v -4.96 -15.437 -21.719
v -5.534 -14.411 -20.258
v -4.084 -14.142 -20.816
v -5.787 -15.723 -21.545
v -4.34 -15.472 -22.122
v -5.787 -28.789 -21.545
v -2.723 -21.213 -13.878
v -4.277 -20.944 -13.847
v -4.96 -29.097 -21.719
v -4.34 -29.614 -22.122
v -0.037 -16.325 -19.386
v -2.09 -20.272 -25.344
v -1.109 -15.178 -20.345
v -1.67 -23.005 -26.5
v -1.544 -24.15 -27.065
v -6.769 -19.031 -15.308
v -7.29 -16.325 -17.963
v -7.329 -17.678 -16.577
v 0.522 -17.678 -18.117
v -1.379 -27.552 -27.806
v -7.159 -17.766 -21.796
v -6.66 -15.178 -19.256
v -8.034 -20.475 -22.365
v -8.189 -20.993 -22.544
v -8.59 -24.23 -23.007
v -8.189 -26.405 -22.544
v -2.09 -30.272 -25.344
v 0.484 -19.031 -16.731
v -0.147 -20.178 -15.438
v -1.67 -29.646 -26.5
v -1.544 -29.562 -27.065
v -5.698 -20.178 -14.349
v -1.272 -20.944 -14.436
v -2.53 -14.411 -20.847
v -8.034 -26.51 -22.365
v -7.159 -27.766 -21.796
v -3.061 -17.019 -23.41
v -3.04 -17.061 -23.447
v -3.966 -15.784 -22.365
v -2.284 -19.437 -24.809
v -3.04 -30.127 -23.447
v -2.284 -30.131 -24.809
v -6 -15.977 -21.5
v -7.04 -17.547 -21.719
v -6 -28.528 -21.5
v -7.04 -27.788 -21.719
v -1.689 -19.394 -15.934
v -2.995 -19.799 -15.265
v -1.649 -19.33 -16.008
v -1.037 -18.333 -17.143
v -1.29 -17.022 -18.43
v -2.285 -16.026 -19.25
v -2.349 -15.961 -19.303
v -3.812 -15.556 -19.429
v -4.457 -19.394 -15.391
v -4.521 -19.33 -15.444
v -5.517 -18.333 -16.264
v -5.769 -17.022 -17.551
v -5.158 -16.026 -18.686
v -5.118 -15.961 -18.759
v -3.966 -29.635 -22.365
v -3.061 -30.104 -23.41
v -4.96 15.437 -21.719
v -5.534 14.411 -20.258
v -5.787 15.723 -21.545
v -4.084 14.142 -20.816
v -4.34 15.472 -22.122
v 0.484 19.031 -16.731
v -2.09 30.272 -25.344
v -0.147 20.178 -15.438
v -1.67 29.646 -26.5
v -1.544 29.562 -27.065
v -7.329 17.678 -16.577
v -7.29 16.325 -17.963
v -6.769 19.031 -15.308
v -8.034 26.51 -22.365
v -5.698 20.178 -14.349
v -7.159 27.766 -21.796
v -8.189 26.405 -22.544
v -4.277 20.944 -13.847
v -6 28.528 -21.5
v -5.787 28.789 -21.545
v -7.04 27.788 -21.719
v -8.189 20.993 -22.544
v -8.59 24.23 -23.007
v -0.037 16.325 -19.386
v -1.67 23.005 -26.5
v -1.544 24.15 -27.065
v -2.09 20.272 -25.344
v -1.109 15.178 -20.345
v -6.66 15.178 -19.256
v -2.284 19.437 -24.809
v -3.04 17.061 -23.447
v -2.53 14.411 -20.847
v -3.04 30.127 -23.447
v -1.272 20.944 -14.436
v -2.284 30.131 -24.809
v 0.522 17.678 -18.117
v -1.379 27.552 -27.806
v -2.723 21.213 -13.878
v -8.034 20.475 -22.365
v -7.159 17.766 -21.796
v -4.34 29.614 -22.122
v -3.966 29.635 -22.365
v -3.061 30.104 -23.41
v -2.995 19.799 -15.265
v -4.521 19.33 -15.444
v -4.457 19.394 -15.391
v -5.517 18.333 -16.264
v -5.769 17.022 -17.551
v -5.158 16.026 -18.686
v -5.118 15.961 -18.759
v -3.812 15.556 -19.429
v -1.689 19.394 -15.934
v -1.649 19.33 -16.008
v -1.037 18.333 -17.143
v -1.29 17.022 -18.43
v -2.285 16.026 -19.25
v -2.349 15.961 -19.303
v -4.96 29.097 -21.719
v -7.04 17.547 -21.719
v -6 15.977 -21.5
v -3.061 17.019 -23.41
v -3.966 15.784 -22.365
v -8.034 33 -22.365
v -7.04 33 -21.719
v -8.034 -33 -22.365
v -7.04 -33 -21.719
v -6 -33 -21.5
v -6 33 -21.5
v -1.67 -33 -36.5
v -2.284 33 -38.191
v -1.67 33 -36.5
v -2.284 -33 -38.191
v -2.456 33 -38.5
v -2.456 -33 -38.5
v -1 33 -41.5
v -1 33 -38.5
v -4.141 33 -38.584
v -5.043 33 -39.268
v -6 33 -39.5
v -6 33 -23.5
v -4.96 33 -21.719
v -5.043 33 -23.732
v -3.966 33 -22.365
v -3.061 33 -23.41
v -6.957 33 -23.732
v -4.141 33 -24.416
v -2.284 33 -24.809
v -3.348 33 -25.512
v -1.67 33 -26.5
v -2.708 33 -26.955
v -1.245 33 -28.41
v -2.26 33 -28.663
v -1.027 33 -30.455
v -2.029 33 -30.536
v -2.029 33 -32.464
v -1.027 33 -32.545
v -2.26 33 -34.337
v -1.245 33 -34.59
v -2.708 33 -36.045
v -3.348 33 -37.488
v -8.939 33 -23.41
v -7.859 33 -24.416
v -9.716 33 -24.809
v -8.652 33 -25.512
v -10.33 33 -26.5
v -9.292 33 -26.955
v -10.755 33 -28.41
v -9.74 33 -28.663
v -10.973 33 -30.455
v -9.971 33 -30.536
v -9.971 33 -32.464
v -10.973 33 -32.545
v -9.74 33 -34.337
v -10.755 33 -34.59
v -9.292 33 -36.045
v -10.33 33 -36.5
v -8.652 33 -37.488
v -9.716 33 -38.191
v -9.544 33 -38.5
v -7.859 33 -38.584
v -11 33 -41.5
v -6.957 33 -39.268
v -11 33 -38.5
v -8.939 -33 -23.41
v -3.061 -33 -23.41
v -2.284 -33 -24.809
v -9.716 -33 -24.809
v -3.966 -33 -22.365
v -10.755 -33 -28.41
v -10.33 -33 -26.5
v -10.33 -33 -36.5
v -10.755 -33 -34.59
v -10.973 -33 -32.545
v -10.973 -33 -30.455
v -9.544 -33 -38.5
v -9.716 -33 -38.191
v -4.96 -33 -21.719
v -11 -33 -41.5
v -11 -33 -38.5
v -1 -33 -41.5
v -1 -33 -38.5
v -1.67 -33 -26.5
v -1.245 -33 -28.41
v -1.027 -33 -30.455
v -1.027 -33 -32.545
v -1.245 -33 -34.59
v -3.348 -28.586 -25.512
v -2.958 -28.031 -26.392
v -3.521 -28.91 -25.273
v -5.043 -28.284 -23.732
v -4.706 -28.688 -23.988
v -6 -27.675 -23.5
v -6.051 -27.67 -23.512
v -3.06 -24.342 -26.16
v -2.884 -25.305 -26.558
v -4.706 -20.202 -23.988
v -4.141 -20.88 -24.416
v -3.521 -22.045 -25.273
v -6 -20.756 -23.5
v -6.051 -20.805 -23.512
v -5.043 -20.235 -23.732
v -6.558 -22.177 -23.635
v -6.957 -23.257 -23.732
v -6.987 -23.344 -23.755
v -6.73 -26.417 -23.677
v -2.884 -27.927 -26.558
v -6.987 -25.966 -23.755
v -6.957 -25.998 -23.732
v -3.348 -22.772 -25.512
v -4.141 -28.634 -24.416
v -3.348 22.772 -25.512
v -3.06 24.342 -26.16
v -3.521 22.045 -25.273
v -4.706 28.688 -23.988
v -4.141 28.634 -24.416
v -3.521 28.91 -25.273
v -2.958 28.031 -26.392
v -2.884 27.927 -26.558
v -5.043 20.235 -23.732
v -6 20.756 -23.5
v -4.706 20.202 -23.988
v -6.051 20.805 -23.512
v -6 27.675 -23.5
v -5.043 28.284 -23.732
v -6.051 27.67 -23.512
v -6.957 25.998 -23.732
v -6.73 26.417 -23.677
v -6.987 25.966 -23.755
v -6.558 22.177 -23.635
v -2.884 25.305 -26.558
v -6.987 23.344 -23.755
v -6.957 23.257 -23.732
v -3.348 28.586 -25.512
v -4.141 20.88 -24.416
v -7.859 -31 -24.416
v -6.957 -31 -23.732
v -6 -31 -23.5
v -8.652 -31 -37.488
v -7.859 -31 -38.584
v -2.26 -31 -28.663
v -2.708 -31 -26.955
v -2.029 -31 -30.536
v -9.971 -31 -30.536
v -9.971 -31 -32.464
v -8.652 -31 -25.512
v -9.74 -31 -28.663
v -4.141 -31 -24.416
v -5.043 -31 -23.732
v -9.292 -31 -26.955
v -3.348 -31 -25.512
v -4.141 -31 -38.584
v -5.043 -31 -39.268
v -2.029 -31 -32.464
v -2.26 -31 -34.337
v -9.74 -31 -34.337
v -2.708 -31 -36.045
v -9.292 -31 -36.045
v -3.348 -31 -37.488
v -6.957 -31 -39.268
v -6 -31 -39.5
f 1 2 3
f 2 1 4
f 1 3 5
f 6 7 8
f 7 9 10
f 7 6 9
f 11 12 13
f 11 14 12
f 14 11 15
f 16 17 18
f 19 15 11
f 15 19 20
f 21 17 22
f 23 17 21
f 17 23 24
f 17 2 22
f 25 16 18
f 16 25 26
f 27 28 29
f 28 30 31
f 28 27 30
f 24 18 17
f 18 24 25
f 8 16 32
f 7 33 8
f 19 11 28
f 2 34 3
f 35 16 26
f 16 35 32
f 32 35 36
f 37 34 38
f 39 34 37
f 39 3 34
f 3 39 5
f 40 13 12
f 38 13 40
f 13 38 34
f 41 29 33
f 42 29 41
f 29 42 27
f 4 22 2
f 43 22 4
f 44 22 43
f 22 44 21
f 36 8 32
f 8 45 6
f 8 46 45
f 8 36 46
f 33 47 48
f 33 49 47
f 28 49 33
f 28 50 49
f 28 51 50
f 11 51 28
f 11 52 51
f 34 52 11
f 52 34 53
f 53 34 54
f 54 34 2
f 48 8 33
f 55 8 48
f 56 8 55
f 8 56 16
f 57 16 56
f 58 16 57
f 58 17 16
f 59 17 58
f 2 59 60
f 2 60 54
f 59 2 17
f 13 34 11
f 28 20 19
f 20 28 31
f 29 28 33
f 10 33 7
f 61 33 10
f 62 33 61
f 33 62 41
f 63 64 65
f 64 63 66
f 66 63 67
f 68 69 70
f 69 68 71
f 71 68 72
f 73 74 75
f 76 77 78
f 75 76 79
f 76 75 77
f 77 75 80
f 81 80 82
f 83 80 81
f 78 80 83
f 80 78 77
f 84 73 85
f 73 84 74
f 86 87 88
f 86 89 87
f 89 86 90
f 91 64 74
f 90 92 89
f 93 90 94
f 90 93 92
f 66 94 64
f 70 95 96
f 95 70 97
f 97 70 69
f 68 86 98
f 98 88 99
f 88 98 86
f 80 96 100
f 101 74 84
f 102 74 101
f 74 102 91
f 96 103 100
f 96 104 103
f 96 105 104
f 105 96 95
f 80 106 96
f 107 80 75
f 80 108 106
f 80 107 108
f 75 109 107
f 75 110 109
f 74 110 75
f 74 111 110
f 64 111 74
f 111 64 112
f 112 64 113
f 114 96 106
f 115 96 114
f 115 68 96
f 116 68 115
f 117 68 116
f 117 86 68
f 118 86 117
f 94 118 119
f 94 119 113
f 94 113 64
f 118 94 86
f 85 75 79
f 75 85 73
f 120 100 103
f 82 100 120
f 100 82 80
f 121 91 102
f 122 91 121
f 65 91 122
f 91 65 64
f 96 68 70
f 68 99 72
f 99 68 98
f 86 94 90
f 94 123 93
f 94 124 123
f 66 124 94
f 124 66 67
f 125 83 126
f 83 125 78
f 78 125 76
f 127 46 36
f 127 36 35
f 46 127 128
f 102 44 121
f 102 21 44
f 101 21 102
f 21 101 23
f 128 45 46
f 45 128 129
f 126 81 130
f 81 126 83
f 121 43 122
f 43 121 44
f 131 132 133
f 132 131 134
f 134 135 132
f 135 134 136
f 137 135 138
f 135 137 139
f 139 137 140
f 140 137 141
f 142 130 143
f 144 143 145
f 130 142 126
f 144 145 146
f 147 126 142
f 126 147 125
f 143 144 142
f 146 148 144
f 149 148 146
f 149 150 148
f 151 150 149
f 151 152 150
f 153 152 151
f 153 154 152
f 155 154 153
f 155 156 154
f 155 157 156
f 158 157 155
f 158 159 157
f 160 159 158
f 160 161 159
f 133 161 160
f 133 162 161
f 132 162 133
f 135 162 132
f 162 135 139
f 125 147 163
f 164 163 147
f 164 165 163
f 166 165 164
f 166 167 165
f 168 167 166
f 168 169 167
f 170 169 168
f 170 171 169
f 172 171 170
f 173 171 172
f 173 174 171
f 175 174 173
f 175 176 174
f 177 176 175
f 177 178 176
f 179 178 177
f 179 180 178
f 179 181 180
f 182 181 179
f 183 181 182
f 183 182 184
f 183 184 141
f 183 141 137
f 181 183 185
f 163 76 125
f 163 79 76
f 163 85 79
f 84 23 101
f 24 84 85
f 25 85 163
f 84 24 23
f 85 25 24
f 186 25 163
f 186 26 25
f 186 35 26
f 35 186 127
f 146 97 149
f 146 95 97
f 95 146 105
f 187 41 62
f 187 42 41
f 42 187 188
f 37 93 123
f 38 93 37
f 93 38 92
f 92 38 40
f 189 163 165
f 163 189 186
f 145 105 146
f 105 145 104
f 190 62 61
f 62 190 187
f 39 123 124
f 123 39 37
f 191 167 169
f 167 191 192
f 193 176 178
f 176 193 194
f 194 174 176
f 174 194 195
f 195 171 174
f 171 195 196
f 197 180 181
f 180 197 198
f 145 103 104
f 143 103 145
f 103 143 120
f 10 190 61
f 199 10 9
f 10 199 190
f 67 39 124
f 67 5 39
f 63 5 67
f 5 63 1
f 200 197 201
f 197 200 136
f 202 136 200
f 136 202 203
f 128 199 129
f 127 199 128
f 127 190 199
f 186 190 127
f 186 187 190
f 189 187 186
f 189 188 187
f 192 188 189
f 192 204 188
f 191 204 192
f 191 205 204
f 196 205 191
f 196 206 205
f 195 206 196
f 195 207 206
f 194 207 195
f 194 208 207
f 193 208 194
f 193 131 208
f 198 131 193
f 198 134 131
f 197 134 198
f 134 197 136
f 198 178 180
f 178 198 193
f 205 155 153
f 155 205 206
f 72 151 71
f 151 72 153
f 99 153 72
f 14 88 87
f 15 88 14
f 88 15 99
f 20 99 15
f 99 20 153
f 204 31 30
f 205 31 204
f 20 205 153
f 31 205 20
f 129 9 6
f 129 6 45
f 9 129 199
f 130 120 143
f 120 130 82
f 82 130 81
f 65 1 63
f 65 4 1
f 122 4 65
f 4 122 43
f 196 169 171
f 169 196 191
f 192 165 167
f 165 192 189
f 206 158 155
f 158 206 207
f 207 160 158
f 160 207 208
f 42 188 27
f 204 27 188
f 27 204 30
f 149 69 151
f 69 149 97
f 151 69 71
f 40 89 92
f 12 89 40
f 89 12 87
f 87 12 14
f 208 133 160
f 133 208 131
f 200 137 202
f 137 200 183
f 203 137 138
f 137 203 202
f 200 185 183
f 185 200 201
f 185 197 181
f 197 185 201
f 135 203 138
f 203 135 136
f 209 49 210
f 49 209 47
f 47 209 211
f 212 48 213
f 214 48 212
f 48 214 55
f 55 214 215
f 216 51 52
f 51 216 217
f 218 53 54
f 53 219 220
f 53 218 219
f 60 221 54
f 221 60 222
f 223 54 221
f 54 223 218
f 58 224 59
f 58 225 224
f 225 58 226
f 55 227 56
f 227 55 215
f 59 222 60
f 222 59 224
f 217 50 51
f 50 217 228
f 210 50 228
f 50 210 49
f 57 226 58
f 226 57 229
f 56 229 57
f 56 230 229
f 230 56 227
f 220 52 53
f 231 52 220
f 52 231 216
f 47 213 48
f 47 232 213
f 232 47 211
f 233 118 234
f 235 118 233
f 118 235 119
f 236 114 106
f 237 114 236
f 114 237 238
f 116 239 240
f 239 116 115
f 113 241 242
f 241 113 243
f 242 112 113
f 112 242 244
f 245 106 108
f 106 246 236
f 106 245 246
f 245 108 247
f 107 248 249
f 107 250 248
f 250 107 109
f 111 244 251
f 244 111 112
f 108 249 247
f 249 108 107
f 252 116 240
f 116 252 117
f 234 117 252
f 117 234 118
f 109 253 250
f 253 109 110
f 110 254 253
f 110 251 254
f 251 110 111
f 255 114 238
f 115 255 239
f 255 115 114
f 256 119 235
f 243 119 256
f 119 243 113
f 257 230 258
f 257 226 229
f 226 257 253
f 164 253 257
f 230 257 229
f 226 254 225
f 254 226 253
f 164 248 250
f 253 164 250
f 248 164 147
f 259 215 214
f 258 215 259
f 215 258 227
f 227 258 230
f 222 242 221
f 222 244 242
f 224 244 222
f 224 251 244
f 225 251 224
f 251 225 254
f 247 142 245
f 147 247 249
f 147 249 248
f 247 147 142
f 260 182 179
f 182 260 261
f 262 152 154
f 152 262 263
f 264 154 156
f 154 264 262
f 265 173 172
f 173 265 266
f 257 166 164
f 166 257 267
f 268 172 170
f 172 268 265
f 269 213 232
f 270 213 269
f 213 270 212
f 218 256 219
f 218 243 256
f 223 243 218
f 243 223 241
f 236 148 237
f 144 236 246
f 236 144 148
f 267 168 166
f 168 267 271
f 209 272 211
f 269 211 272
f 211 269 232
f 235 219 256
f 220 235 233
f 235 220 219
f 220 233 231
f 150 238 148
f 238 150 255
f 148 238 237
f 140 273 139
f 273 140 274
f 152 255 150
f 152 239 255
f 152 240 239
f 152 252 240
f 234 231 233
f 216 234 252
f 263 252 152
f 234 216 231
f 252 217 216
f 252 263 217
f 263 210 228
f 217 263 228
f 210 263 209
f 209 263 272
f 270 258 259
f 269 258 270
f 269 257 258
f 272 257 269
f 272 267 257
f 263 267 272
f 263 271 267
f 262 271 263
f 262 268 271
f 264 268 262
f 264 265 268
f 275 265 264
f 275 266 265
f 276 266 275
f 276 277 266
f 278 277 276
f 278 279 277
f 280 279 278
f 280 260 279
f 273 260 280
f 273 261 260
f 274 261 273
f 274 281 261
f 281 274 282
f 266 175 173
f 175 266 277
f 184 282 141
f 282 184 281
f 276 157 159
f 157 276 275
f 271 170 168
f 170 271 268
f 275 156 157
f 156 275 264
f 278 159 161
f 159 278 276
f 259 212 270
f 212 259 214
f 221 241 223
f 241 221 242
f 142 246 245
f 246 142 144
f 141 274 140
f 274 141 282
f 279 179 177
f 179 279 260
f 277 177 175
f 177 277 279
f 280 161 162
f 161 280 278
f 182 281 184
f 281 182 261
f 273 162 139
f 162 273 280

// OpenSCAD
module nose(){
	scale([1,0.8,1])  cylinder(16.5 ,r=3);
}


module noses(){
	rotate([0,11.1,0]){
		rotate([90,0,-45]) translate([0,0,24]) nose();
		rotate([90,0,-45-90]) translate([0,0,24]) nose();
	}
}

module channel(){
	translate([-31.5,35,6])rotate([90,0,0]) scale([1,0.5,1]) 
		cylinder(66,r=8);
}

module inner(){
	noses();
	channel();
}

module nose_body(){
	scale([1,0.8,1]) cylinder(15 ,r=5);
}

module noses_body(){
	rotate([0,11.1,0]){
		rotate([90,0,-45]) translate([0,0,25]) nose_body();
		rotate([90,0,-45-90]) translate([0,0,25]) nose_body();
	}
}

module channel_body(){
	translate([-31.5,33,6])rotate([90,0,0]) scale([1,0.5,1]) 
		cylinder(66,r=10);
	translate([-41.5,33,1])rotate([90,0,0]) 
		cube([3,10,66]);
}

module outer(){
	noses_body();
	channel_body();
}

rotate([0,-90,0])
difference(){
	outer();
	inner();
}
